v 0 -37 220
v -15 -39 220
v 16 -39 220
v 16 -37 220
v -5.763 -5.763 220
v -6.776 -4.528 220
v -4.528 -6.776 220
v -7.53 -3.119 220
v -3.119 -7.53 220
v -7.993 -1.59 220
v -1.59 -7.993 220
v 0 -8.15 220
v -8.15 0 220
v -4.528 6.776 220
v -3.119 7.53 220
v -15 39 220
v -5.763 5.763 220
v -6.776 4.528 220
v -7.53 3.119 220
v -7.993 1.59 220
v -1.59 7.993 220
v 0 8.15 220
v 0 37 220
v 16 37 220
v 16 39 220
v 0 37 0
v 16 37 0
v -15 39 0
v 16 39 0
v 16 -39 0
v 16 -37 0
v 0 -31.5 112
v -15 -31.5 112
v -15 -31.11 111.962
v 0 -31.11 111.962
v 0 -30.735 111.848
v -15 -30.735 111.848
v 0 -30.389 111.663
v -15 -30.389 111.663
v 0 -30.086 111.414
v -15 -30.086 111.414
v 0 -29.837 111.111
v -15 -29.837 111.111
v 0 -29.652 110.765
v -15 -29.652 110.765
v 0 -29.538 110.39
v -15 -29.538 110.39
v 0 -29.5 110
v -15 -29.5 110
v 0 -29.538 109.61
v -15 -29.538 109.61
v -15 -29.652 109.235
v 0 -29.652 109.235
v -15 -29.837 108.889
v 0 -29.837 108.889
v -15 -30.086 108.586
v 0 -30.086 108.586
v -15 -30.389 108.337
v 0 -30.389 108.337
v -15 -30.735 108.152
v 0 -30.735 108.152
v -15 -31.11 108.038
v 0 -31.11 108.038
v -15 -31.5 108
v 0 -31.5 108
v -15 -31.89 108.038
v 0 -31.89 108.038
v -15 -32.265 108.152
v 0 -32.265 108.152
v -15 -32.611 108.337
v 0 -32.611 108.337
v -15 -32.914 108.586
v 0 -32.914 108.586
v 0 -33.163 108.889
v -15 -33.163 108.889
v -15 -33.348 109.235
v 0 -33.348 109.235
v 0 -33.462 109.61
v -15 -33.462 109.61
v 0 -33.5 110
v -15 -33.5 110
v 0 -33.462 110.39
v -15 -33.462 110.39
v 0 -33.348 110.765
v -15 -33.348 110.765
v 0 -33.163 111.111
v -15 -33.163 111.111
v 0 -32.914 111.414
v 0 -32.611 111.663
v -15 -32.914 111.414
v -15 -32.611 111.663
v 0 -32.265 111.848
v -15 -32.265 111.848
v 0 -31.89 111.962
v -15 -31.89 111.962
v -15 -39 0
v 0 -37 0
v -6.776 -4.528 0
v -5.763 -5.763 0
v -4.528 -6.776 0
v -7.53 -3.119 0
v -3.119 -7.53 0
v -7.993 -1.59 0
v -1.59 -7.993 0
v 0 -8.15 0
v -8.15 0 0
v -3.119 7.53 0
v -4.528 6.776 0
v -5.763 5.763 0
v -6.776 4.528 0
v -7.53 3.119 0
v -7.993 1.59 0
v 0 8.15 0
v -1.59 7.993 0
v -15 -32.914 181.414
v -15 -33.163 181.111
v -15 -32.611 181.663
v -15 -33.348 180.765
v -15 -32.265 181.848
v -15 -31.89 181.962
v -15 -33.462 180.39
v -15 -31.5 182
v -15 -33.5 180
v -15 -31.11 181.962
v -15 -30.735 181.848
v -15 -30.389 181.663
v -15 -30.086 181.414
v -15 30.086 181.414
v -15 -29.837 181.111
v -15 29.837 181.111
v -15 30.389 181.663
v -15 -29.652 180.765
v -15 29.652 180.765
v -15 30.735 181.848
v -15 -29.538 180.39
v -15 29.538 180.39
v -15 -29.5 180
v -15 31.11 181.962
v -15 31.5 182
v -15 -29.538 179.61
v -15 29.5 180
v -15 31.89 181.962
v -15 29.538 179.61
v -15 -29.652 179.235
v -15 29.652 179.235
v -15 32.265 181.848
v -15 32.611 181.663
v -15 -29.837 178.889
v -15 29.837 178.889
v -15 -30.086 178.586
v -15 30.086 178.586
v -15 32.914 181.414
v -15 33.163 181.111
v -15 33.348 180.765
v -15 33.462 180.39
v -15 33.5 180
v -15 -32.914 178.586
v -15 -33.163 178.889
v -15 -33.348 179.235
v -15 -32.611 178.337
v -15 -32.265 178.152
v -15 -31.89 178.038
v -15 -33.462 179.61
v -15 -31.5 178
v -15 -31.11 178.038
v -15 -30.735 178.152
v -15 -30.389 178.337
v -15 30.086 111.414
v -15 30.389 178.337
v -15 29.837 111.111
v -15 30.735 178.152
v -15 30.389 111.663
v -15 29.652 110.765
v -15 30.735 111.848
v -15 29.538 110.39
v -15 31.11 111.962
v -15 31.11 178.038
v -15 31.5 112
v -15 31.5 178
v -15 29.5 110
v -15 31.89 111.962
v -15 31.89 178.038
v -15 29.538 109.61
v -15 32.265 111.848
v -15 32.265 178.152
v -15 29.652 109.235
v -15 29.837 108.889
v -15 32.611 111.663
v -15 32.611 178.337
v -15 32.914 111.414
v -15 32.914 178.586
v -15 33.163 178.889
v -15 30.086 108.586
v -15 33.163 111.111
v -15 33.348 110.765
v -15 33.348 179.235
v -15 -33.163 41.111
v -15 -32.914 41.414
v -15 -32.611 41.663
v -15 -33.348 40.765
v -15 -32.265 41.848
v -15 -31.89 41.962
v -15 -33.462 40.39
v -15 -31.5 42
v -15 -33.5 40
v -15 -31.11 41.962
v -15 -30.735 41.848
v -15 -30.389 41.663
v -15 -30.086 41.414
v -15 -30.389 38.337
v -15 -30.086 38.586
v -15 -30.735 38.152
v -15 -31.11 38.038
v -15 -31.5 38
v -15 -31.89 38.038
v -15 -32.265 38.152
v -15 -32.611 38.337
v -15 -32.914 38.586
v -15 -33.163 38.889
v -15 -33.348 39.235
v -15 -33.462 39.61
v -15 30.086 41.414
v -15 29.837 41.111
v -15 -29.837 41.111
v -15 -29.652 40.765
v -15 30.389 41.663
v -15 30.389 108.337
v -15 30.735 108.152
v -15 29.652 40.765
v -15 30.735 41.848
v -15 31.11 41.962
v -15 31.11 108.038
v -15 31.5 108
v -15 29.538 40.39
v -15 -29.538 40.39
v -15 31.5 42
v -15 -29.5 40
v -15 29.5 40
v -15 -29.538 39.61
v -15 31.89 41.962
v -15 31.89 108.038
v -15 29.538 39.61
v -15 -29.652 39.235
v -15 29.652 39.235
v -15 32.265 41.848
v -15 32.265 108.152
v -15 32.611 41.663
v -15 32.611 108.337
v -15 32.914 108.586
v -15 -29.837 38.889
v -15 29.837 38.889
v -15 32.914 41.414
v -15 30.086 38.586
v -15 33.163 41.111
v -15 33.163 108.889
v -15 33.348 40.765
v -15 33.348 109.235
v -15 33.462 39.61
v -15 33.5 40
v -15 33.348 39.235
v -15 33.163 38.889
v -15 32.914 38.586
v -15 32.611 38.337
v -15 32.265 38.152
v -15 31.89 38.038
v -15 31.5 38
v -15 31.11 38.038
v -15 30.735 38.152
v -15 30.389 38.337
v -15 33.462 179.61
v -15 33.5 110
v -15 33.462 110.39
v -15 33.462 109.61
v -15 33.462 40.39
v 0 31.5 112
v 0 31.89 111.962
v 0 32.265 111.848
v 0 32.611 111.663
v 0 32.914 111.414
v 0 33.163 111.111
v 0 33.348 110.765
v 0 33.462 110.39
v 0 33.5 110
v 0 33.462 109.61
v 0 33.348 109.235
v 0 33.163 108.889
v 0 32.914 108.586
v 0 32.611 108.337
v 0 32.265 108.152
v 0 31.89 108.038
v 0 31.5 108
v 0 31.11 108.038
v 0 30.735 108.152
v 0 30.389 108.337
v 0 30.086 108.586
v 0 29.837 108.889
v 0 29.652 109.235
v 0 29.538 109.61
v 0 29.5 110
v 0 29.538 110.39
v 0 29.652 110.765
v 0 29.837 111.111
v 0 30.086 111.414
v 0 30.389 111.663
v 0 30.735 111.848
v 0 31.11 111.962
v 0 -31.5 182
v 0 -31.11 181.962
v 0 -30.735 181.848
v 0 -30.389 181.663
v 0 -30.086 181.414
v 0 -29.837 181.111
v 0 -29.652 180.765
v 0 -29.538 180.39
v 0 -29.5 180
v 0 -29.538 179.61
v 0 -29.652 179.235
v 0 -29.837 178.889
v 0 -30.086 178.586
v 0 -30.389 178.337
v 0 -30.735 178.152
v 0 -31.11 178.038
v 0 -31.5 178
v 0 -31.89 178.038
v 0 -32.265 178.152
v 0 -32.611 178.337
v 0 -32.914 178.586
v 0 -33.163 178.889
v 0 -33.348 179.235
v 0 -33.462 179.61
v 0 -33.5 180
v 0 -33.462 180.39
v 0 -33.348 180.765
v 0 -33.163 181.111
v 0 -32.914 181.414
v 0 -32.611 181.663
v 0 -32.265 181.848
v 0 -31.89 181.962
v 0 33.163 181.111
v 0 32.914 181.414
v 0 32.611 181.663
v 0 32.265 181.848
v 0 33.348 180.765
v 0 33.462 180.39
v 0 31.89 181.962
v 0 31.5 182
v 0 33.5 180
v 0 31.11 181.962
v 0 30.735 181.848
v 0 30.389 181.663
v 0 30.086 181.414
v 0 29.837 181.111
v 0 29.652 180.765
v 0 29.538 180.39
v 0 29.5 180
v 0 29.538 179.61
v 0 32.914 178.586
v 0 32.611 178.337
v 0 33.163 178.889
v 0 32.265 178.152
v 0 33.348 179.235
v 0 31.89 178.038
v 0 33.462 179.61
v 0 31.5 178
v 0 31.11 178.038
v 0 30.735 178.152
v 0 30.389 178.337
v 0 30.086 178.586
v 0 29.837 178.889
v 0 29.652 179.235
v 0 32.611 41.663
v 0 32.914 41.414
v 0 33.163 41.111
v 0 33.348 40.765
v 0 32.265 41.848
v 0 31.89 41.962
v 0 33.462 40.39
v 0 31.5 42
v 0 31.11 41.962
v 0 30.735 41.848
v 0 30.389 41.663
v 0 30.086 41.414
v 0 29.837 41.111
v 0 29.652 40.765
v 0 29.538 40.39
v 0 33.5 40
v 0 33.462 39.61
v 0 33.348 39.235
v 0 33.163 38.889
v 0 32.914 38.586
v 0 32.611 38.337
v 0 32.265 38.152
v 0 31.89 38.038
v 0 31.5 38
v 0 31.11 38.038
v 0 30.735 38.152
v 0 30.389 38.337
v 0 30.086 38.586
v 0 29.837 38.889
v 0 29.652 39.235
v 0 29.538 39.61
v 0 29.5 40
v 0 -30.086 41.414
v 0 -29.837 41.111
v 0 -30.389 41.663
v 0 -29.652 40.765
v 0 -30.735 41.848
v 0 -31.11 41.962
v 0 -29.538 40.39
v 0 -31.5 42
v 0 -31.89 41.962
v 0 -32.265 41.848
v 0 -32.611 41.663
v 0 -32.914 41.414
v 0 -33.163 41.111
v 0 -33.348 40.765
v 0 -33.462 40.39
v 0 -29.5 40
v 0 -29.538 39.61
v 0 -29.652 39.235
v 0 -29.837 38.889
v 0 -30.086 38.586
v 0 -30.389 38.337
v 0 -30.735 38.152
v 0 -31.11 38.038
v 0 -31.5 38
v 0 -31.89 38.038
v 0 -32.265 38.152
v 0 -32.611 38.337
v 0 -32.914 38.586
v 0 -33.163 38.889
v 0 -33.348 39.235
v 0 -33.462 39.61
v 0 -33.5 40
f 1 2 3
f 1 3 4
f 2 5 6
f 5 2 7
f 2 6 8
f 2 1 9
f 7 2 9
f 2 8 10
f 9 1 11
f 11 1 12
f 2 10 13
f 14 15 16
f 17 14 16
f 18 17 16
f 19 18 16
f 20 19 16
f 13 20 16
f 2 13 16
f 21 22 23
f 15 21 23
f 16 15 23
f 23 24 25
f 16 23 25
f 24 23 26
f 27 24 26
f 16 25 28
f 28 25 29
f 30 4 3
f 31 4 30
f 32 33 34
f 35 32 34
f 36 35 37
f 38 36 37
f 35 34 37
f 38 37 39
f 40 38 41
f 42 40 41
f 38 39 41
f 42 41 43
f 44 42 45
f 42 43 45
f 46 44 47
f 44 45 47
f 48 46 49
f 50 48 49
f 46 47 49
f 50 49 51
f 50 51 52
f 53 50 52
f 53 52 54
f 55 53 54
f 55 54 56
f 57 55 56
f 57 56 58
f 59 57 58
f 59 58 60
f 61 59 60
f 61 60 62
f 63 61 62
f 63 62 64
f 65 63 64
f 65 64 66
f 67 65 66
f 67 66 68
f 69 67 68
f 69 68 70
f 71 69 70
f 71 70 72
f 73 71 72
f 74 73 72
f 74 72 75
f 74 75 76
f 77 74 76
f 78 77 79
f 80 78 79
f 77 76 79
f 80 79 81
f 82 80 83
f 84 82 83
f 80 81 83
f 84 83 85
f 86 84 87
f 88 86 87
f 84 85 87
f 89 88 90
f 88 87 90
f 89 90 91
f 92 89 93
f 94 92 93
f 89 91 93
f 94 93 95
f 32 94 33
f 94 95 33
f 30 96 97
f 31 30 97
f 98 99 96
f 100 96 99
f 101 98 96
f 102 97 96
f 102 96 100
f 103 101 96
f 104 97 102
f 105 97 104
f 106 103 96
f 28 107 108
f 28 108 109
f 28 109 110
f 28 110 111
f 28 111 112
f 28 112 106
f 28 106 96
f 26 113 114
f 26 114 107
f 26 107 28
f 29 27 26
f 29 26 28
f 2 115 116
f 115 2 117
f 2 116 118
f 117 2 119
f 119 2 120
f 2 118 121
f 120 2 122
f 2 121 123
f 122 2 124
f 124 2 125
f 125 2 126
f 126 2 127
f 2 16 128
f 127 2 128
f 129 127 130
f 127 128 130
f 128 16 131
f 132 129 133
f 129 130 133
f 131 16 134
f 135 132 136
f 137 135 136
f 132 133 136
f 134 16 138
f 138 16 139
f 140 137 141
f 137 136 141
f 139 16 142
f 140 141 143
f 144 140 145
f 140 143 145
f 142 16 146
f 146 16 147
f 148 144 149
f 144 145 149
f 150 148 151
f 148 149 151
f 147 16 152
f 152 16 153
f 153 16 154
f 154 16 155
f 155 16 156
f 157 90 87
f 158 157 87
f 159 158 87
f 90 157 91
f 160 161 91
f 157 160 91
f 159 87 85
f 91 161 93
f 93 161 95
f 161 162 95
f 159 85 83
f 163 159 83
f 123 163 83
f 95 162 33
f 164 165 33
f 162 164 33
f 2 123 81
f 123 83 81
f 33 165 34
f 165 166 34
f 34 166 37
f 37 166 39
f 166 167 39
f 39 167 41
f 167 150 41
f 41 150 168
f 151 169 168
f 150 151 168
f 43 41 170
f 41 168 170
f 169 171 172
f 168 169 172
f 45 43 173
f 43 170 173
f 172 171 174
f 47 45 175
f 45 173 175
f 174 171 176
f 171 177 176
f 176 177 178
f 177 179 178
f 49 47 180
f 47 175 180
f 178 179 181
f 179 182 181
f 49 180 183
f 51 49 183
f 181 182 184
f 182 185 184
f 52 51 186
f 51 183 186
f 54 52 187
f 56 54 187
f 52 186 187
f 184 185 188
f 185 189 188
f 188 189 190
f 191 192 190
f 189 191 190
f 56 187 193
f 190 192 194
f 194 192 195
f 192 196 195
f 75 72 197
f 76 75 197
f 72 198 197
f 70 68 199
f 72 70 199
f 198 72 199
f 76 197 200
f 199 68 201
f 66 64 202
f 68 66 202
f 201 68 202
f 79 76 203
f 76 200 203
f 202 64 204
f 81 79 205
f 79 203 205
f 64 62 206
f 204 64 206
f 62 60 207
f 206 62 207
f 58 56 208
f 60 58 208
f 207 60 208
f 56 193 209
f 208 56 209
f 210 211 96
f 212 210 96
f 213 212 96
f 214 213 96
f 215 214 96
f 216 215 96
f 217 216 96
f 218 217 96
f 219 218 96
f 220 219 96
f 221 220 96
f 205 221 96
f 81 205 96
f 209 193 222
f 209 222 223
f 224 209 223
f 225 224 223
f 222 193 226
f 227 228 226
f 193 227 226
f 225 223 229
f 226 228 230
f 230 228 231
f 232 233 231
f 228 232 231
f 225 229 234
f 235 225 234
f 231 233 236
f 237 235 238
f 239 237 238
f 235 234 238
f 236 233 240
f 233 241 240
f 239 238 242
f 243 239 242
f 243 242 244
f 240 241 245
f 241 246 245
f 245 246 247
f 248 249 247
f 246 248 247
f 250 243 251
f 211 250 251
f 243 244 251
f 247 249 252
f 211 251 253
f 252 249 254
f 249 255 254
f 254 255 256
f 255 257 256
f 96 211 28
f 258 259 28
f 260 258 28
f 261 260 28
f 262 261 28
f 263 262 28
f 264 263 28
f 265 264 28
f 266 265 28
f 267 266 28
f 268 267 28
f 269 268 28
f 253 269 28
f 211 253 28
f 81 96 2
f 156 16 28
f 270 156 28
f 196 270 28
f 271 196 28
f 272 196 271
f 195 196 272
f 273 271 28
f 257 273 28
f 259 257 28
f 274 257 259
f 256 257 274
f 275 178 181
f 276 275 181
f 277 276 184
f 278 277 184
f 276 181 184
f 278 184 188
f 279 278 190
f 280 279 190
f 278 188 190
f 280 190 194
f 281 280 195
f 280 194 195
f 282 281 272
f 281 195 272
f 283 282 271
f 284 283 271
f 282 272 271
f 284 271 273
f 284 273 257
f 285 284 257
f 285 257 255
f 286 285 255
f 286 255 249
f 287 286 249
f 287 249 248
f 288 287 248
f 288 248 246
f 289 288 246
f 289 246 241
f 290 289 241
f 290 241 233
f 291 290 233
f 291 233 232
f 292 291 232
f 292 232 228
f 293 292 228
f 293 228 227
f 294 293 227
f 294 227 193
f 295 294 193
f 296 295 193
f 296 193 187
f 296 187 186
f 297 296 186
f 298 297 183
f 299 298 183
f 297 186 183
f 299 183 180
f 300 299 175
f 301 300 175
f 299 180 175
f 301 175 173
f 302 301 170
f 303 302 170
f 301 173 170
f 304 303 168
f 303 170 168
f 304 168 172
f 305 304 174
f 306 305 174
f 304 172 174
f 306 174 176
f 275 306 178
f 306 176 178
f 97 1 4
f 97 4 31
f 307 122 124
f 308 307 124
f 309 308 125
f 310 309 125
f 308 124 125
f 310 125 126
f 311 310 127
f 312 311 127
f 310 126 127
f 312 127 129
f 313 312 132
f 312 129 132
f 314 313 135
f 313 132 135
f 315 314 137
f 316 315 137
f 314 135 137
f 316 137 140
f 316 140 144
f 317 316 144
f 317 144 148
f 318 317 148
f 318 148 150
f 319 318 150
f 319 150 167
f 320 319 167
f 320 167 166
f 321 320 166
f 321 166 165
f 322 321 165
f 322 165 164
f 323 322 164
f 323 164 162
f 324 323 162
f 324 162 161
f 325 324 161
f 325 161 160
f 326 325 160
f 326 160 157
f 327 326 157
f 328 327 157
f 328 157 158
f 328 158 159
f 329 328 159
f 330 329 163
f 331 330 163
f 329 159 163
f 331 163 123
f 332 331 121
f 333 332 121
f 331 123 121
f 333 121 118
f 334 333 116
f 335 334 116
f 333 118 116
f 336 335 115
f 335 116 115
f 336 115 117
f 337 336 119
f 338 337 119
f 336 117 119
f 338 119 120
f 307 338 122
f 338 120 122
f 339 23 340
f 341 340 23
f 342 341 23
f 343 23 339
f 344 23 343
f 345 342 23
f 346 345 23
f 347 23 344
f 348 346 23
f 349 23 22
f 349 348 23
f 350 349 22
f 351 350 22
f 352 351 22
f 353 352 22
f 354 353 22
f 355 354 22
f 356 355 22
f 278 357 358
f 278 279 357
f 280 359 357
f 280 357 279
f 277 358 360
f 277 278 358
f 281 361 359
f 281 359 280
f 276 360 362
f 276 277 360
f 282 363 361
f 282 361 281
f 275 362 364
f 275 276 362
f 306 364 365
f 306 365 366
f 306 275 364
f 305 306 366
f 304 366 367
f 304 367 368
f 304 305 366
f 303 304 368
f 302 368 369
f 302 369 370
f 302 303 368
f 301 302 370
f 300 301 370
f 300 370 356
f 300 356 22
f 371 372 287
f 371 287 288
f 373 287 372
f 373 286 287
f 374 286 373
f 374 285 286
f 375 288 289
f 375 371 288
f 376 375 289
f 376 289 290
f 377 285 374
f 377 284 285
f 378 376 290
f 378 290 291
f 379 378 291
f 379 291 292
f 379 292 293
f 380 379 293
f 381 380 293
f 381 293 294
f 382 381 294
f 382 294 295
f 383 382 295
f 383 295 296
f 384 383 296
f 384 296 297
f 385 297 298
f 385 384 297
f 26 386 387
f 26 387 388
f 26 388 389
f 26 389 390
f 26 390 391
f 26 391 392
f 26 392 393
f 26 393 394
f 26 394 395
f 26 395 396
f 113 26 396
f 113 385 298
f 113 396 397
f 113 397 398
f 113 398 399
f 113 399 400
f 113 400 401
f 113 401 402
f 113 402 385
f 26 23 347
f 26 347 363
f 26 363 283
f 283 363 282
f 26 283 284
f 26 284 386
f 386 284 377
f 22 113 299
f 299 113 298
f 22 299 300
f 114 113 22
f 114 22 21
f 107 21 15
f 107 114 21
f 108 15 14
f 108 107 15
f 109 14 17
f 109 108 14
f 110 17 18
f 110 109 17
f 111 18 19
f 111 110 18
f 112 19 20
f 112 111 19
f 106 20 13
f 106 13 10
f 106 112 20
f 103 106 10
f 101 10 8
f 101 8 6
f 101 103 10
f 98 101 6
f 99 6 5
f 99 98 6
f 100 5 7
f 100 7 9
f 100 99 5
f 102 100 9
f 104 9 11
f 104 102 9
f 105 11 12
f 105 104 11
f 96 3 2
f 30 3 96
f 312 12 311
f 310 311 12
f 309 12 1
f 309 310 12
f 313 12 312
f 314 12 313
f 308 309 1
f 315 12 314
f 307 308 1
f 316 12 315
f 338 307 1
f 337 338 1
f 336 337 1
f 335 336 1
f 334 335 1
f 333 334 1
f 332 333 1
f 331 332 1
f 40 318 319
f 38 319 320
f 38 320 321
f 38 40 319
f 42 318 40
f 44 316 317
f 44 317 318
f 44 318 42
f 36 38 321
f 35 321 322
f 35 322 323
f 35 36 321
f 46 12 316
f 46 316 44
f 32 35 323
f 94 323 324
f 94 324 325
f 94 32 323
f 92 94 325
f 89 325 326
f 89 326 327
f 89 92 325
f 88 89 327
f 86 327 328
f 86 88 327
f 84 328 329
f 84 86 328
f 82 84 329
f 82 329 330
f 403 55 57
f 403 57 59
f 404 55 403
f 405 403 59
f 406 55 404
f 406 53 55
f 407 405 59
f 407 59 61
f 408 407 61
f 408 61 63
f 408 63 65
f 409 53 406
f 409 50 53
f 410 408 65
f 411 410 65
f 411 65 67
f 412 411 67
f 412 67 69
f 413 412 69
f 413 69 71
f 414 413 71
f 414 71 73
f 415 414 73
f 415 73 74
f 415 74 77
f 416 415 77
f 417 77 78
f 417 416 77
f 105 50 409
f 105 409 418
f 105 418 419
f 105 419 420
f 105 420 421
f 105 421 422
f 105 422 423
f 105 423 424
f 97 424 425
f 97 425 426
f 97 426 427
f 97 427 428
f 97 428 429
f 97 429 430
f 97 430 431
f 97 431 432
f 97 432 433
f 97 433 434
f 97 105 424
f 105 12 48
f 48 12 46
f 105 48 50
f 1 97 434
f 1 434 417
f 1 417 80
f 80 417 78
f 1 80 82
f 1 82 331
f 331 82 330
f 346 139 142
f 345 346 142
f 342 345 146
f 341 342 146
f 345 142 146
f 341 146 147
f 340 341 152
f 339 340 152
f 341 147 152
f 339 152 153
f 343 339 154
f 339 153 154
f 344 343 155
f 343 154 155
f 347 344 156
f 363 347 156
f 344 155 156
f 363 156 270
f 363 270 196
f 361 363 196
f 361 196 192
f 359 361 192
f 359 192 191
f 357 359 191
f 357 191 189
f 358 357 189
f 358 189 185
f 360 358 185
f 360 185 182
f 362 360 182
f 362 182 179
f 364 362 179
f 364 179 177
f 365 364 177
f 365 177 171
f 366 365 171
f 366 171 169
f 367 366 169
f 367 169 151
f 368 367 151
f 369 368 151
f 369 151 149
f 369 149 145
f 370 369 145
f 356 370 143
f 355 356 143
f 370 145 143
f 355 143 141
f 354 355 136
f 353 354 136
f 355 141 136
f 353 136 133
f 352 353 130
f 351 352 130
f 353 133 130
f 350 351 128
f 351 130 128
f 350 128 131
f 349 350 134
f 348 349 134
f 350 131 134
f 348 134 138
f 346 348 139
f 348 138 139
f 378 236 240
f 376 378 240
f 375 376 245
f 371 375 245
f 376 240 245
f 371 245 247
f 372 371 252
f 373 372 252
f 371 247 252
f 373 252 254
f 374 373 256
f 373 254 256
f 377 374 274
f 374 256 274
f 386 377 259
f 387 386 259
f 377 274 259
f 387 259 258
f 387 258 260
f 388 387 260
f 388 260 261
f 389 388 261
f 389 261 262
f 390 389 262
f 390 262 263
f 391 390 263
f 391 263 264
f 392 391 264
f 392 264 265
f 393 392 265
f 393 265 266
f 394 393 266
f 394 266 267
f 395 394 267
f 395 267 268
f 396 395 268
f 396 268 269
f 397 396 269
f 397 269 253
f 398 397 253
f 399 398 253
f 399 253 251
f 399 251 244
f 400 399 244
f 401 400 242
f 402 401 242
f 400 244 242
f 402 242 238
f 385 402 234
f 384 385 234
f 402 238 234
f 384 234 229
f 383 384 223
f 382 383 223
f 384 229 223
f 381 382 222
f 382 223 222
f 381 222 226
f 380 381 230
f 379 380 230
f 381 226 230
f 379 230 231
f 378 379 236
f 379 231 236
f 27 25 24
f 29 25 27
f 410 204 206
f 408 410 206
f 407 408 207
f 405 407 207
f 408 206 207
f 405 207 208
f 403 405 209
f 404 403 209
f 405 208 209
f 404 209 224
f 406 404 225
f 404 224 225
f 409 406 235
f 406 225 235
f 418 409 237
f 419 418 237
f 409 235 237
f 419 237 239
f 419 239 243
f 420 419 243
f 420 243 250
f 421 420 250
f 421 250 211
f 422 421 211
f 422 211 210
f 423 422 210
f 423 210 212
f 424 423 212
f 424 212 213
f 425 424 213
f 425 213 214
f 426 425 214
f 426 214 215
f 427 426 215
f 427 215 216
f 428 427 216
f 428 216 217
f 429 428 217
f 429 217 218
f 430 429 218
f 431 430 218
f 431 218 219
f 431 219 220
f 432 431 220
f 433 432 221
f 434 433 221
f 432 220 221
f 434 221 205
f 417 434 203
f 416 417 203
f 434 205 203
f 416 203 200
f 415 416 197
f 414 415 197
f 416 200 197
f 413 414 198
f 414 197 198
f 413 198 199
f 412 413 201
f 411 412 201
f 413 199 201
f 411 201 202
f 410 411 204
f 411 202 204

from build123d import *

# Parameters (mm, degrees)
SALIENTE_EXTRUIR1_DEPTH   = 220
CROQUIS5_R                = 2
CORTAR_EXTRUIR5_DEPTH     = 20
CROQUIS7_W                = 220
CROQUIS7_H                = 2
SALIENTE_EXTRUIR2_DEPTH   = 16
SALIENTE_EXTRUIR2_2_DEPTH = 16
CROQUIS7_3_W              = 220
CROQUIS7_3_H              = 2
SALIENTE_EXTRUIR3_DEPTH   = 15


with BuildPart() as part:
    # Croquis1 → Saliente-Extruir1 (new body)
    with BuildSketch(Plane.XY):
        with BuildLine():
            Line((0, 37), (0, 8.15))
            ThreePointArc((0, 8.15), (-8.15, 0), (0, -8.15))
            Line((0, -8.15), (0, -37))
            Line((0, -37), (-15, -37))
            Line((-15, -37), (-15, 37))
            Line((-15, 37), (0, 37))
        make_face()
    extrude(amount=SALIENTE_EXTRUIR1_DEPTH)

    # Croquis5 → Cortar-Extruir5 (cut)
    with BuildSketch(Plane.ZY.offset(15)):
        with Locations((110, -31.5)):
            Circle(CROQUIS5_R)
        with Locations((110, 31.5)):
            Circle(CROQUIS5_R)
        with Locations((40, 31.5)):
            Circle(CROQUIS5_R)
        with Locations((40, -31.5)):
            Circle(CROQUIS5_R)
        with Locations((180, 31.5)):
            Circle(CROQUIS5_R)
        with Locations((180, -31.5)):
            Circle(CROQUIS5_R)
    extrude(amount=-CORTAR_EXTRUIR5_DEPTH, mode=Mode.SUBTRACT)



with BuildPart() as body_2:
    # Croquis7 → Saliente-Extruir2 (new body)
    with BuildSketch(Plane(origin=(0, 0, 0), x_dir=(0, 0, -1), z_dir=(1, 0, 0))):
        with Locations((-110, -38)):
            Rectangle(CROQUIS7_W, CROQUIS7_H)
    extrude(amount=SALIENTE_EXTRUIR2_DEPTH)


with BuildPart() as body_3:
    # Croquis7 → Saliente-Extruir2 2 (new body)
    with BuildSketch(Plane(origin=(0, 0, 0), x_dir=(0, 0, -1), z_dir=(1, 0, 0))):
        with Locations((-110, 38)):
            Rectangle(CROQUIS7_W, CROQUIS7_H)
    extrude(amount=SALIENTE_EXTRUIR2_2_DEPTH)


with BuildPart() as part_1:
    add(part.part)

    add(body_2.part)  # Saliente-Extruir3 merges body 2

    add(body_3.part)  # Saliente-Extruir3 merges body 3
    # Croquis7_3 → Saliente-Extruir3 (add)
    with BuildSketch(Plane(origin=(0, 0, 0), x_dir=(0, 0, -1), z_dir=(1, 0, 0))):
        with Locations((-110, -38)):
            Rectangle(CROQUIS7_3_W, CROQUIS7_3_H)
        with Locations((-110, 38)):
            Rectangle(CROQUIS7_3_W, CROQUIS7_3_H)
    extrude(amount=-SALIENTE_EXTRUIR3_DEPTH)


solid = part_1.part
